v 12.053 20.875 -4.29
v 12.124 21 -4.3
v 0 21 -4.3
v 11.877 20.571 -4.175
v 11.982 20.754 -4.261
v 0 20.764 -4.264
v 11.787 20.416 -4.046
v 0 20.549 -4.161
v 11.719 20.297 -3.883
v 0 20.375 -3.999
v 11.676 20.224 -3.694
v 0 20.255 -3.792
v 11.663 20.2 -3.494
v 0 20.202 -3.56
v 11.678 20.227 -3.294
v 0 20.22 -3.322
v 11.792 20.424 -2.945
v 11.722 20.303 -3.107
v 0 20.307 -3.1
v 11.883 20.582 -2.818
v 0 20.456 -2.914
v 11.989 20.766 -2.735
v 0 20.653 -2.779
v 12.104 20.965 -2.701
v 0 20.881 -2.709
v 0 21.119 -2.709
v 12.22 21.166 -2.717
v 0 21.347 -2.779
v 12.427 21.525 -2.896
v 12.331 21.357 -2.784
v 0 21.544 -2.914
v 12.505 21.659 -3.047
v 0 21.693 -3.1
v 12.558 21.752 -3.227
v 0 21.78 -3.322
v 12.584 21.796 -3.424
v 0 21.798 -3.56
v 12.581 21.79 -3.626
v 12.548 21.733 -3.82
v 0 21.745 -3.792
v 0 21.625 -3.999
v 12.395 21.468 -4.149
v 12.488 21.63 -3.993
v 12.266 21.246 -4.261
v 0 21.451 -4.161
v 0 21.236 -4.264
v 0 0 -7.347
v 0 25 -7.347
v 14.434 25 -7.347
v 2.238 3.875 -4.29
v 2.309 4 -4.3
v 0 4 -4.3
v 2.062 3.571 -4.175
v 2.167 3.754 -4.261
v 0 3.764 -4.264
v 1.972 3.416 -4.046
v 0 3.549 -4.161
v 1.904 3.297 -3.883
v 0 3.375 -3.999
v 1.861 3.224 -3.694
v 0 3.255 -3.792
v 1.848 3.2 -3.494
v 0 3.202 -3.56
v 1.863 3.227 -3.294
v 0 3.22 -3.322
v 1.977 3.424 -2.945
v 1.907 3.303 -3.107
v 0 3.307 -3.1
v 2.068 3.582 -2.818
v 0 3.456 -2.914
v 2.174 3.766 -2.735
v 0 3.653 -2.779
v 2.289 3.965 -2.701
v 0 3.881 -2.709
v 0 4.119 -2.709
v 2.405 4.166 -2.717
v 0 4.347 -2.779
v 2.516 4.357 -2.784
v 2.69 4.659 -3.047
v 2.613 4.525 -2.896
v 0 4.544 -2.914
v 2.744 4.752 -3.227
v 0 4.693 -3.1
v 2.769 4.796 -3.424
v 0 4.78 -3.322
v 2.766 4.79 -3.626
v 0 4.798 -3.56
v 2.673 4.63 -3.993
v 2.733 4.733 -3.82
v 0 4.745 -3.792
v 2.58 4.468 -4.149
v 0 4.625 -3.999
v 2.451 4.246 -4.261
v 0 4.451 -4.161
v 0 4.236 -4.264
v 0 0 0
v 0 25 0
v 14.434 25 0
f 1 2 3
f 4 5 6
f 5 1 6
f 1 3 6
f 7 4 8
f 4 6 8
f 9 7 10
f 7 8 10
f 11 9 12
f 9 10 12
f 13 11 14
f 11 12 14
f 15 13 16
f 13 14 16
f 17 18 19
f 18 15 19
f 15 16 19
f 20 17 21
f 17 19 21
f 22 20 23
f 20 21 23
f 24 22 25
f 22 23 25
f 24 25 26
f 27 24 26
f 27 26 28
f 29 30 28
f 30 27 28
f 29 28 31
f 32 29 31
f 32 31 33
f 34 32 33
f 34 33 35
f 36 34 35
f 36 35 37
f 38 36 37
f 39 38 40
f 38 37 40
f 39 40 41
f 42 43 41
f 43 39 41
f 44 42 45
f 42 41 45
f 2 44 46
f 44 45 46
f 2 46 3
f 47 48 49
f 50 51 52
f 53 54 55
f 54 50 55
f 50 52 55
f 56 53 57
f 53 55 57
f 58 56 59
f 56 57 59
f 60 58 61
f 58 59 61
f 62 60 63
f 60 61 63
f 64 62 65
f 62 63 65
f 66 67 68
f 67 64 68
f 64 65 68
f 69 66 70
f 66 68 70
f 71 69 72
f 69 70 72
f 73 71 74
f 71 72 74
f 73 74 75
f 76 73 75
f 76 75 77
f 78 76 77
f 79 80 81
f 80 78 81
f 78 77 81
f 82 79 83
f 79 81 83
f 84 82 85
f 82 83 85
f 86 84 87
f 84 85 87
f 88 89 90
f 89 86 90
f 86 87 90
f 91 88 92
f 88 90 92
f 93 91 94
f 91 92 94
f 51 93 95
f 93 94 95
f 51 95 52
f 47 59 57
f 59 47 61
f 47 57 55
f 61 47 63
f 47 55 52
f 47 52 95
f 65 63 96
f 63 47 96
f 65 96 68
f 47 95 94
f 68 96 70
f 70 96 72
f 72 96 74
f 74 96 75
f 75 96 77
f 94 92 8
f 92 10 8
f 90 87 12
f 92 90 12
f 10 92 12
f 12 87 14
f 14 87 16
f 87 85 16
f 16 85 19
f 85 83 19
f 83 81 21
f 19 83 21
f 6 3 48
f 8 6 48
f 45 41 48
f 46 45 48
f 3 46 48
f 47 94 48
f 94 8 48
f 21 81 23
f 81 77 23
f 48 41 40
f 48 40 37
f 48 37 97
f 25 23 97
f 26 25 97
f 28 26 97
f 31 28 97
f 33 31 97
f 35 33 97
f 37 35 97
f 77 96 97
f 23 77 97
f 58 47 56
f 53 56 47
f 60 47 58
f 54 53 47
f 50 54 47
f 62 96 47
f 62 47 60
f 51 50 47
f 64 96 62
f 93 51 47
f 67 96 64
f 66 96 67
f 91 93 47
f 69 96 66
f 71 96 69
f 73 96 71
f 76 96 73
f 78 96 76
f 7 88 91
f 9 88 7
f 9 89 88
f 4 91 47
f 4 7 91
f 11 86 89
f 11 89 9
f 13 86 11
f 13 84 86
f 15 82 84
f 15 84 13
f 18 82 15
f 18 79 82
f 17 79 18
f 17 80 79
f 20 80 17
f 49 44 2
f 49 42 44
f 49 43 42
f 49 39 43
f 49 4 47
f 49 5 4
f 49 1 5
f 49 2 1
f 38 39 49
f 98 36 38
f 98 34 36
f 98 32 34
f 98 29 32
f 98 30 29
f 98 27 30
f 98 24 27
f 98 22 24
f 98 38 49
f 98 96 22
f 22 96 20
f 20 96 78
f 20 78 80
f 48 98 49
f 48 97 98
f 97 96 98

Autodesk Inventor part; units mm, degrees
ref_plane "YZ Plane" through (0, 0, 0) normal (1, 0, 0) x (0, 1, 0)
ref_plane "XZ Plane" through (0, 0, 0) normal (0, 1, 0) x (-1, 0, 0)
ref_plane "XY Plane" through (0, 0, 0) normal (0, 0, 1) x (1, 0, 0)
sketch "Esquisse1" plane through (0, 0, 0) normal (1, 0, 0) x (0, 1, 0)
  line L0 (0, 0) -> (25, 0)
  line L1 (25, 0) -> (25, -7.347)
  line L2 (25, -7.347) -> (0, -7.347)
  line L3 (0, -7.347) -> (0, 0)
  dimension "d0" = 25
  dimension "d1" = 7.347
extrude "Extrusion1" add sketch "Esquisse1" along normal blind 20
sketch "Esquisse3" plane through (20, 0, 0) normal (1, 0, 0) x (0, 0, -1)
  line L0 (0, 0) -> (7.347, 0) projected
  line L1 (0, 0) -> (3.5, 0)
  line L2 (3.5, 0) -> (3.5, 4)
  line L3 (7.347, 25) -> (0, 25) projected
  line L4 (0, 25) -> (3.5, 25)
  line L5 (3.5, 25) -> (3.5, 21)
  dimension "d7" = 3.5
  dimension "d8" = 4
  dimension "d9" = 3.5
  dimension "d10" = 4
  dimension "d11" = 90
hole "Perçage1" at (20, 4, -3.5) at (20, 21, -3.5) direction (-1, 0, 0) diameter 1.6 end through all
sketch "Esquisse4" plane through (0, 0, 0) normal (0, 0, 1) x (1, 0, 0)
  line L0 (0, 0) -> (20, 0) projected
  line L1 (0, 0) -> (14.4338, 25)
  line L2 (0, 25) -> (20, 25) projected
  line L3 (0, 0) -> (28.8675, 0) construction
  line L4 (0, 25) -> (20, 25) projected
  line L5 (20, 25) -> (20, 0) projected
  point P0 (10, 17.3205)
  dimension "d19" = 60
extrude "Extrusion3" cut sketch "Esquisse4" against normal blind 10
properties part number "face 30°"
